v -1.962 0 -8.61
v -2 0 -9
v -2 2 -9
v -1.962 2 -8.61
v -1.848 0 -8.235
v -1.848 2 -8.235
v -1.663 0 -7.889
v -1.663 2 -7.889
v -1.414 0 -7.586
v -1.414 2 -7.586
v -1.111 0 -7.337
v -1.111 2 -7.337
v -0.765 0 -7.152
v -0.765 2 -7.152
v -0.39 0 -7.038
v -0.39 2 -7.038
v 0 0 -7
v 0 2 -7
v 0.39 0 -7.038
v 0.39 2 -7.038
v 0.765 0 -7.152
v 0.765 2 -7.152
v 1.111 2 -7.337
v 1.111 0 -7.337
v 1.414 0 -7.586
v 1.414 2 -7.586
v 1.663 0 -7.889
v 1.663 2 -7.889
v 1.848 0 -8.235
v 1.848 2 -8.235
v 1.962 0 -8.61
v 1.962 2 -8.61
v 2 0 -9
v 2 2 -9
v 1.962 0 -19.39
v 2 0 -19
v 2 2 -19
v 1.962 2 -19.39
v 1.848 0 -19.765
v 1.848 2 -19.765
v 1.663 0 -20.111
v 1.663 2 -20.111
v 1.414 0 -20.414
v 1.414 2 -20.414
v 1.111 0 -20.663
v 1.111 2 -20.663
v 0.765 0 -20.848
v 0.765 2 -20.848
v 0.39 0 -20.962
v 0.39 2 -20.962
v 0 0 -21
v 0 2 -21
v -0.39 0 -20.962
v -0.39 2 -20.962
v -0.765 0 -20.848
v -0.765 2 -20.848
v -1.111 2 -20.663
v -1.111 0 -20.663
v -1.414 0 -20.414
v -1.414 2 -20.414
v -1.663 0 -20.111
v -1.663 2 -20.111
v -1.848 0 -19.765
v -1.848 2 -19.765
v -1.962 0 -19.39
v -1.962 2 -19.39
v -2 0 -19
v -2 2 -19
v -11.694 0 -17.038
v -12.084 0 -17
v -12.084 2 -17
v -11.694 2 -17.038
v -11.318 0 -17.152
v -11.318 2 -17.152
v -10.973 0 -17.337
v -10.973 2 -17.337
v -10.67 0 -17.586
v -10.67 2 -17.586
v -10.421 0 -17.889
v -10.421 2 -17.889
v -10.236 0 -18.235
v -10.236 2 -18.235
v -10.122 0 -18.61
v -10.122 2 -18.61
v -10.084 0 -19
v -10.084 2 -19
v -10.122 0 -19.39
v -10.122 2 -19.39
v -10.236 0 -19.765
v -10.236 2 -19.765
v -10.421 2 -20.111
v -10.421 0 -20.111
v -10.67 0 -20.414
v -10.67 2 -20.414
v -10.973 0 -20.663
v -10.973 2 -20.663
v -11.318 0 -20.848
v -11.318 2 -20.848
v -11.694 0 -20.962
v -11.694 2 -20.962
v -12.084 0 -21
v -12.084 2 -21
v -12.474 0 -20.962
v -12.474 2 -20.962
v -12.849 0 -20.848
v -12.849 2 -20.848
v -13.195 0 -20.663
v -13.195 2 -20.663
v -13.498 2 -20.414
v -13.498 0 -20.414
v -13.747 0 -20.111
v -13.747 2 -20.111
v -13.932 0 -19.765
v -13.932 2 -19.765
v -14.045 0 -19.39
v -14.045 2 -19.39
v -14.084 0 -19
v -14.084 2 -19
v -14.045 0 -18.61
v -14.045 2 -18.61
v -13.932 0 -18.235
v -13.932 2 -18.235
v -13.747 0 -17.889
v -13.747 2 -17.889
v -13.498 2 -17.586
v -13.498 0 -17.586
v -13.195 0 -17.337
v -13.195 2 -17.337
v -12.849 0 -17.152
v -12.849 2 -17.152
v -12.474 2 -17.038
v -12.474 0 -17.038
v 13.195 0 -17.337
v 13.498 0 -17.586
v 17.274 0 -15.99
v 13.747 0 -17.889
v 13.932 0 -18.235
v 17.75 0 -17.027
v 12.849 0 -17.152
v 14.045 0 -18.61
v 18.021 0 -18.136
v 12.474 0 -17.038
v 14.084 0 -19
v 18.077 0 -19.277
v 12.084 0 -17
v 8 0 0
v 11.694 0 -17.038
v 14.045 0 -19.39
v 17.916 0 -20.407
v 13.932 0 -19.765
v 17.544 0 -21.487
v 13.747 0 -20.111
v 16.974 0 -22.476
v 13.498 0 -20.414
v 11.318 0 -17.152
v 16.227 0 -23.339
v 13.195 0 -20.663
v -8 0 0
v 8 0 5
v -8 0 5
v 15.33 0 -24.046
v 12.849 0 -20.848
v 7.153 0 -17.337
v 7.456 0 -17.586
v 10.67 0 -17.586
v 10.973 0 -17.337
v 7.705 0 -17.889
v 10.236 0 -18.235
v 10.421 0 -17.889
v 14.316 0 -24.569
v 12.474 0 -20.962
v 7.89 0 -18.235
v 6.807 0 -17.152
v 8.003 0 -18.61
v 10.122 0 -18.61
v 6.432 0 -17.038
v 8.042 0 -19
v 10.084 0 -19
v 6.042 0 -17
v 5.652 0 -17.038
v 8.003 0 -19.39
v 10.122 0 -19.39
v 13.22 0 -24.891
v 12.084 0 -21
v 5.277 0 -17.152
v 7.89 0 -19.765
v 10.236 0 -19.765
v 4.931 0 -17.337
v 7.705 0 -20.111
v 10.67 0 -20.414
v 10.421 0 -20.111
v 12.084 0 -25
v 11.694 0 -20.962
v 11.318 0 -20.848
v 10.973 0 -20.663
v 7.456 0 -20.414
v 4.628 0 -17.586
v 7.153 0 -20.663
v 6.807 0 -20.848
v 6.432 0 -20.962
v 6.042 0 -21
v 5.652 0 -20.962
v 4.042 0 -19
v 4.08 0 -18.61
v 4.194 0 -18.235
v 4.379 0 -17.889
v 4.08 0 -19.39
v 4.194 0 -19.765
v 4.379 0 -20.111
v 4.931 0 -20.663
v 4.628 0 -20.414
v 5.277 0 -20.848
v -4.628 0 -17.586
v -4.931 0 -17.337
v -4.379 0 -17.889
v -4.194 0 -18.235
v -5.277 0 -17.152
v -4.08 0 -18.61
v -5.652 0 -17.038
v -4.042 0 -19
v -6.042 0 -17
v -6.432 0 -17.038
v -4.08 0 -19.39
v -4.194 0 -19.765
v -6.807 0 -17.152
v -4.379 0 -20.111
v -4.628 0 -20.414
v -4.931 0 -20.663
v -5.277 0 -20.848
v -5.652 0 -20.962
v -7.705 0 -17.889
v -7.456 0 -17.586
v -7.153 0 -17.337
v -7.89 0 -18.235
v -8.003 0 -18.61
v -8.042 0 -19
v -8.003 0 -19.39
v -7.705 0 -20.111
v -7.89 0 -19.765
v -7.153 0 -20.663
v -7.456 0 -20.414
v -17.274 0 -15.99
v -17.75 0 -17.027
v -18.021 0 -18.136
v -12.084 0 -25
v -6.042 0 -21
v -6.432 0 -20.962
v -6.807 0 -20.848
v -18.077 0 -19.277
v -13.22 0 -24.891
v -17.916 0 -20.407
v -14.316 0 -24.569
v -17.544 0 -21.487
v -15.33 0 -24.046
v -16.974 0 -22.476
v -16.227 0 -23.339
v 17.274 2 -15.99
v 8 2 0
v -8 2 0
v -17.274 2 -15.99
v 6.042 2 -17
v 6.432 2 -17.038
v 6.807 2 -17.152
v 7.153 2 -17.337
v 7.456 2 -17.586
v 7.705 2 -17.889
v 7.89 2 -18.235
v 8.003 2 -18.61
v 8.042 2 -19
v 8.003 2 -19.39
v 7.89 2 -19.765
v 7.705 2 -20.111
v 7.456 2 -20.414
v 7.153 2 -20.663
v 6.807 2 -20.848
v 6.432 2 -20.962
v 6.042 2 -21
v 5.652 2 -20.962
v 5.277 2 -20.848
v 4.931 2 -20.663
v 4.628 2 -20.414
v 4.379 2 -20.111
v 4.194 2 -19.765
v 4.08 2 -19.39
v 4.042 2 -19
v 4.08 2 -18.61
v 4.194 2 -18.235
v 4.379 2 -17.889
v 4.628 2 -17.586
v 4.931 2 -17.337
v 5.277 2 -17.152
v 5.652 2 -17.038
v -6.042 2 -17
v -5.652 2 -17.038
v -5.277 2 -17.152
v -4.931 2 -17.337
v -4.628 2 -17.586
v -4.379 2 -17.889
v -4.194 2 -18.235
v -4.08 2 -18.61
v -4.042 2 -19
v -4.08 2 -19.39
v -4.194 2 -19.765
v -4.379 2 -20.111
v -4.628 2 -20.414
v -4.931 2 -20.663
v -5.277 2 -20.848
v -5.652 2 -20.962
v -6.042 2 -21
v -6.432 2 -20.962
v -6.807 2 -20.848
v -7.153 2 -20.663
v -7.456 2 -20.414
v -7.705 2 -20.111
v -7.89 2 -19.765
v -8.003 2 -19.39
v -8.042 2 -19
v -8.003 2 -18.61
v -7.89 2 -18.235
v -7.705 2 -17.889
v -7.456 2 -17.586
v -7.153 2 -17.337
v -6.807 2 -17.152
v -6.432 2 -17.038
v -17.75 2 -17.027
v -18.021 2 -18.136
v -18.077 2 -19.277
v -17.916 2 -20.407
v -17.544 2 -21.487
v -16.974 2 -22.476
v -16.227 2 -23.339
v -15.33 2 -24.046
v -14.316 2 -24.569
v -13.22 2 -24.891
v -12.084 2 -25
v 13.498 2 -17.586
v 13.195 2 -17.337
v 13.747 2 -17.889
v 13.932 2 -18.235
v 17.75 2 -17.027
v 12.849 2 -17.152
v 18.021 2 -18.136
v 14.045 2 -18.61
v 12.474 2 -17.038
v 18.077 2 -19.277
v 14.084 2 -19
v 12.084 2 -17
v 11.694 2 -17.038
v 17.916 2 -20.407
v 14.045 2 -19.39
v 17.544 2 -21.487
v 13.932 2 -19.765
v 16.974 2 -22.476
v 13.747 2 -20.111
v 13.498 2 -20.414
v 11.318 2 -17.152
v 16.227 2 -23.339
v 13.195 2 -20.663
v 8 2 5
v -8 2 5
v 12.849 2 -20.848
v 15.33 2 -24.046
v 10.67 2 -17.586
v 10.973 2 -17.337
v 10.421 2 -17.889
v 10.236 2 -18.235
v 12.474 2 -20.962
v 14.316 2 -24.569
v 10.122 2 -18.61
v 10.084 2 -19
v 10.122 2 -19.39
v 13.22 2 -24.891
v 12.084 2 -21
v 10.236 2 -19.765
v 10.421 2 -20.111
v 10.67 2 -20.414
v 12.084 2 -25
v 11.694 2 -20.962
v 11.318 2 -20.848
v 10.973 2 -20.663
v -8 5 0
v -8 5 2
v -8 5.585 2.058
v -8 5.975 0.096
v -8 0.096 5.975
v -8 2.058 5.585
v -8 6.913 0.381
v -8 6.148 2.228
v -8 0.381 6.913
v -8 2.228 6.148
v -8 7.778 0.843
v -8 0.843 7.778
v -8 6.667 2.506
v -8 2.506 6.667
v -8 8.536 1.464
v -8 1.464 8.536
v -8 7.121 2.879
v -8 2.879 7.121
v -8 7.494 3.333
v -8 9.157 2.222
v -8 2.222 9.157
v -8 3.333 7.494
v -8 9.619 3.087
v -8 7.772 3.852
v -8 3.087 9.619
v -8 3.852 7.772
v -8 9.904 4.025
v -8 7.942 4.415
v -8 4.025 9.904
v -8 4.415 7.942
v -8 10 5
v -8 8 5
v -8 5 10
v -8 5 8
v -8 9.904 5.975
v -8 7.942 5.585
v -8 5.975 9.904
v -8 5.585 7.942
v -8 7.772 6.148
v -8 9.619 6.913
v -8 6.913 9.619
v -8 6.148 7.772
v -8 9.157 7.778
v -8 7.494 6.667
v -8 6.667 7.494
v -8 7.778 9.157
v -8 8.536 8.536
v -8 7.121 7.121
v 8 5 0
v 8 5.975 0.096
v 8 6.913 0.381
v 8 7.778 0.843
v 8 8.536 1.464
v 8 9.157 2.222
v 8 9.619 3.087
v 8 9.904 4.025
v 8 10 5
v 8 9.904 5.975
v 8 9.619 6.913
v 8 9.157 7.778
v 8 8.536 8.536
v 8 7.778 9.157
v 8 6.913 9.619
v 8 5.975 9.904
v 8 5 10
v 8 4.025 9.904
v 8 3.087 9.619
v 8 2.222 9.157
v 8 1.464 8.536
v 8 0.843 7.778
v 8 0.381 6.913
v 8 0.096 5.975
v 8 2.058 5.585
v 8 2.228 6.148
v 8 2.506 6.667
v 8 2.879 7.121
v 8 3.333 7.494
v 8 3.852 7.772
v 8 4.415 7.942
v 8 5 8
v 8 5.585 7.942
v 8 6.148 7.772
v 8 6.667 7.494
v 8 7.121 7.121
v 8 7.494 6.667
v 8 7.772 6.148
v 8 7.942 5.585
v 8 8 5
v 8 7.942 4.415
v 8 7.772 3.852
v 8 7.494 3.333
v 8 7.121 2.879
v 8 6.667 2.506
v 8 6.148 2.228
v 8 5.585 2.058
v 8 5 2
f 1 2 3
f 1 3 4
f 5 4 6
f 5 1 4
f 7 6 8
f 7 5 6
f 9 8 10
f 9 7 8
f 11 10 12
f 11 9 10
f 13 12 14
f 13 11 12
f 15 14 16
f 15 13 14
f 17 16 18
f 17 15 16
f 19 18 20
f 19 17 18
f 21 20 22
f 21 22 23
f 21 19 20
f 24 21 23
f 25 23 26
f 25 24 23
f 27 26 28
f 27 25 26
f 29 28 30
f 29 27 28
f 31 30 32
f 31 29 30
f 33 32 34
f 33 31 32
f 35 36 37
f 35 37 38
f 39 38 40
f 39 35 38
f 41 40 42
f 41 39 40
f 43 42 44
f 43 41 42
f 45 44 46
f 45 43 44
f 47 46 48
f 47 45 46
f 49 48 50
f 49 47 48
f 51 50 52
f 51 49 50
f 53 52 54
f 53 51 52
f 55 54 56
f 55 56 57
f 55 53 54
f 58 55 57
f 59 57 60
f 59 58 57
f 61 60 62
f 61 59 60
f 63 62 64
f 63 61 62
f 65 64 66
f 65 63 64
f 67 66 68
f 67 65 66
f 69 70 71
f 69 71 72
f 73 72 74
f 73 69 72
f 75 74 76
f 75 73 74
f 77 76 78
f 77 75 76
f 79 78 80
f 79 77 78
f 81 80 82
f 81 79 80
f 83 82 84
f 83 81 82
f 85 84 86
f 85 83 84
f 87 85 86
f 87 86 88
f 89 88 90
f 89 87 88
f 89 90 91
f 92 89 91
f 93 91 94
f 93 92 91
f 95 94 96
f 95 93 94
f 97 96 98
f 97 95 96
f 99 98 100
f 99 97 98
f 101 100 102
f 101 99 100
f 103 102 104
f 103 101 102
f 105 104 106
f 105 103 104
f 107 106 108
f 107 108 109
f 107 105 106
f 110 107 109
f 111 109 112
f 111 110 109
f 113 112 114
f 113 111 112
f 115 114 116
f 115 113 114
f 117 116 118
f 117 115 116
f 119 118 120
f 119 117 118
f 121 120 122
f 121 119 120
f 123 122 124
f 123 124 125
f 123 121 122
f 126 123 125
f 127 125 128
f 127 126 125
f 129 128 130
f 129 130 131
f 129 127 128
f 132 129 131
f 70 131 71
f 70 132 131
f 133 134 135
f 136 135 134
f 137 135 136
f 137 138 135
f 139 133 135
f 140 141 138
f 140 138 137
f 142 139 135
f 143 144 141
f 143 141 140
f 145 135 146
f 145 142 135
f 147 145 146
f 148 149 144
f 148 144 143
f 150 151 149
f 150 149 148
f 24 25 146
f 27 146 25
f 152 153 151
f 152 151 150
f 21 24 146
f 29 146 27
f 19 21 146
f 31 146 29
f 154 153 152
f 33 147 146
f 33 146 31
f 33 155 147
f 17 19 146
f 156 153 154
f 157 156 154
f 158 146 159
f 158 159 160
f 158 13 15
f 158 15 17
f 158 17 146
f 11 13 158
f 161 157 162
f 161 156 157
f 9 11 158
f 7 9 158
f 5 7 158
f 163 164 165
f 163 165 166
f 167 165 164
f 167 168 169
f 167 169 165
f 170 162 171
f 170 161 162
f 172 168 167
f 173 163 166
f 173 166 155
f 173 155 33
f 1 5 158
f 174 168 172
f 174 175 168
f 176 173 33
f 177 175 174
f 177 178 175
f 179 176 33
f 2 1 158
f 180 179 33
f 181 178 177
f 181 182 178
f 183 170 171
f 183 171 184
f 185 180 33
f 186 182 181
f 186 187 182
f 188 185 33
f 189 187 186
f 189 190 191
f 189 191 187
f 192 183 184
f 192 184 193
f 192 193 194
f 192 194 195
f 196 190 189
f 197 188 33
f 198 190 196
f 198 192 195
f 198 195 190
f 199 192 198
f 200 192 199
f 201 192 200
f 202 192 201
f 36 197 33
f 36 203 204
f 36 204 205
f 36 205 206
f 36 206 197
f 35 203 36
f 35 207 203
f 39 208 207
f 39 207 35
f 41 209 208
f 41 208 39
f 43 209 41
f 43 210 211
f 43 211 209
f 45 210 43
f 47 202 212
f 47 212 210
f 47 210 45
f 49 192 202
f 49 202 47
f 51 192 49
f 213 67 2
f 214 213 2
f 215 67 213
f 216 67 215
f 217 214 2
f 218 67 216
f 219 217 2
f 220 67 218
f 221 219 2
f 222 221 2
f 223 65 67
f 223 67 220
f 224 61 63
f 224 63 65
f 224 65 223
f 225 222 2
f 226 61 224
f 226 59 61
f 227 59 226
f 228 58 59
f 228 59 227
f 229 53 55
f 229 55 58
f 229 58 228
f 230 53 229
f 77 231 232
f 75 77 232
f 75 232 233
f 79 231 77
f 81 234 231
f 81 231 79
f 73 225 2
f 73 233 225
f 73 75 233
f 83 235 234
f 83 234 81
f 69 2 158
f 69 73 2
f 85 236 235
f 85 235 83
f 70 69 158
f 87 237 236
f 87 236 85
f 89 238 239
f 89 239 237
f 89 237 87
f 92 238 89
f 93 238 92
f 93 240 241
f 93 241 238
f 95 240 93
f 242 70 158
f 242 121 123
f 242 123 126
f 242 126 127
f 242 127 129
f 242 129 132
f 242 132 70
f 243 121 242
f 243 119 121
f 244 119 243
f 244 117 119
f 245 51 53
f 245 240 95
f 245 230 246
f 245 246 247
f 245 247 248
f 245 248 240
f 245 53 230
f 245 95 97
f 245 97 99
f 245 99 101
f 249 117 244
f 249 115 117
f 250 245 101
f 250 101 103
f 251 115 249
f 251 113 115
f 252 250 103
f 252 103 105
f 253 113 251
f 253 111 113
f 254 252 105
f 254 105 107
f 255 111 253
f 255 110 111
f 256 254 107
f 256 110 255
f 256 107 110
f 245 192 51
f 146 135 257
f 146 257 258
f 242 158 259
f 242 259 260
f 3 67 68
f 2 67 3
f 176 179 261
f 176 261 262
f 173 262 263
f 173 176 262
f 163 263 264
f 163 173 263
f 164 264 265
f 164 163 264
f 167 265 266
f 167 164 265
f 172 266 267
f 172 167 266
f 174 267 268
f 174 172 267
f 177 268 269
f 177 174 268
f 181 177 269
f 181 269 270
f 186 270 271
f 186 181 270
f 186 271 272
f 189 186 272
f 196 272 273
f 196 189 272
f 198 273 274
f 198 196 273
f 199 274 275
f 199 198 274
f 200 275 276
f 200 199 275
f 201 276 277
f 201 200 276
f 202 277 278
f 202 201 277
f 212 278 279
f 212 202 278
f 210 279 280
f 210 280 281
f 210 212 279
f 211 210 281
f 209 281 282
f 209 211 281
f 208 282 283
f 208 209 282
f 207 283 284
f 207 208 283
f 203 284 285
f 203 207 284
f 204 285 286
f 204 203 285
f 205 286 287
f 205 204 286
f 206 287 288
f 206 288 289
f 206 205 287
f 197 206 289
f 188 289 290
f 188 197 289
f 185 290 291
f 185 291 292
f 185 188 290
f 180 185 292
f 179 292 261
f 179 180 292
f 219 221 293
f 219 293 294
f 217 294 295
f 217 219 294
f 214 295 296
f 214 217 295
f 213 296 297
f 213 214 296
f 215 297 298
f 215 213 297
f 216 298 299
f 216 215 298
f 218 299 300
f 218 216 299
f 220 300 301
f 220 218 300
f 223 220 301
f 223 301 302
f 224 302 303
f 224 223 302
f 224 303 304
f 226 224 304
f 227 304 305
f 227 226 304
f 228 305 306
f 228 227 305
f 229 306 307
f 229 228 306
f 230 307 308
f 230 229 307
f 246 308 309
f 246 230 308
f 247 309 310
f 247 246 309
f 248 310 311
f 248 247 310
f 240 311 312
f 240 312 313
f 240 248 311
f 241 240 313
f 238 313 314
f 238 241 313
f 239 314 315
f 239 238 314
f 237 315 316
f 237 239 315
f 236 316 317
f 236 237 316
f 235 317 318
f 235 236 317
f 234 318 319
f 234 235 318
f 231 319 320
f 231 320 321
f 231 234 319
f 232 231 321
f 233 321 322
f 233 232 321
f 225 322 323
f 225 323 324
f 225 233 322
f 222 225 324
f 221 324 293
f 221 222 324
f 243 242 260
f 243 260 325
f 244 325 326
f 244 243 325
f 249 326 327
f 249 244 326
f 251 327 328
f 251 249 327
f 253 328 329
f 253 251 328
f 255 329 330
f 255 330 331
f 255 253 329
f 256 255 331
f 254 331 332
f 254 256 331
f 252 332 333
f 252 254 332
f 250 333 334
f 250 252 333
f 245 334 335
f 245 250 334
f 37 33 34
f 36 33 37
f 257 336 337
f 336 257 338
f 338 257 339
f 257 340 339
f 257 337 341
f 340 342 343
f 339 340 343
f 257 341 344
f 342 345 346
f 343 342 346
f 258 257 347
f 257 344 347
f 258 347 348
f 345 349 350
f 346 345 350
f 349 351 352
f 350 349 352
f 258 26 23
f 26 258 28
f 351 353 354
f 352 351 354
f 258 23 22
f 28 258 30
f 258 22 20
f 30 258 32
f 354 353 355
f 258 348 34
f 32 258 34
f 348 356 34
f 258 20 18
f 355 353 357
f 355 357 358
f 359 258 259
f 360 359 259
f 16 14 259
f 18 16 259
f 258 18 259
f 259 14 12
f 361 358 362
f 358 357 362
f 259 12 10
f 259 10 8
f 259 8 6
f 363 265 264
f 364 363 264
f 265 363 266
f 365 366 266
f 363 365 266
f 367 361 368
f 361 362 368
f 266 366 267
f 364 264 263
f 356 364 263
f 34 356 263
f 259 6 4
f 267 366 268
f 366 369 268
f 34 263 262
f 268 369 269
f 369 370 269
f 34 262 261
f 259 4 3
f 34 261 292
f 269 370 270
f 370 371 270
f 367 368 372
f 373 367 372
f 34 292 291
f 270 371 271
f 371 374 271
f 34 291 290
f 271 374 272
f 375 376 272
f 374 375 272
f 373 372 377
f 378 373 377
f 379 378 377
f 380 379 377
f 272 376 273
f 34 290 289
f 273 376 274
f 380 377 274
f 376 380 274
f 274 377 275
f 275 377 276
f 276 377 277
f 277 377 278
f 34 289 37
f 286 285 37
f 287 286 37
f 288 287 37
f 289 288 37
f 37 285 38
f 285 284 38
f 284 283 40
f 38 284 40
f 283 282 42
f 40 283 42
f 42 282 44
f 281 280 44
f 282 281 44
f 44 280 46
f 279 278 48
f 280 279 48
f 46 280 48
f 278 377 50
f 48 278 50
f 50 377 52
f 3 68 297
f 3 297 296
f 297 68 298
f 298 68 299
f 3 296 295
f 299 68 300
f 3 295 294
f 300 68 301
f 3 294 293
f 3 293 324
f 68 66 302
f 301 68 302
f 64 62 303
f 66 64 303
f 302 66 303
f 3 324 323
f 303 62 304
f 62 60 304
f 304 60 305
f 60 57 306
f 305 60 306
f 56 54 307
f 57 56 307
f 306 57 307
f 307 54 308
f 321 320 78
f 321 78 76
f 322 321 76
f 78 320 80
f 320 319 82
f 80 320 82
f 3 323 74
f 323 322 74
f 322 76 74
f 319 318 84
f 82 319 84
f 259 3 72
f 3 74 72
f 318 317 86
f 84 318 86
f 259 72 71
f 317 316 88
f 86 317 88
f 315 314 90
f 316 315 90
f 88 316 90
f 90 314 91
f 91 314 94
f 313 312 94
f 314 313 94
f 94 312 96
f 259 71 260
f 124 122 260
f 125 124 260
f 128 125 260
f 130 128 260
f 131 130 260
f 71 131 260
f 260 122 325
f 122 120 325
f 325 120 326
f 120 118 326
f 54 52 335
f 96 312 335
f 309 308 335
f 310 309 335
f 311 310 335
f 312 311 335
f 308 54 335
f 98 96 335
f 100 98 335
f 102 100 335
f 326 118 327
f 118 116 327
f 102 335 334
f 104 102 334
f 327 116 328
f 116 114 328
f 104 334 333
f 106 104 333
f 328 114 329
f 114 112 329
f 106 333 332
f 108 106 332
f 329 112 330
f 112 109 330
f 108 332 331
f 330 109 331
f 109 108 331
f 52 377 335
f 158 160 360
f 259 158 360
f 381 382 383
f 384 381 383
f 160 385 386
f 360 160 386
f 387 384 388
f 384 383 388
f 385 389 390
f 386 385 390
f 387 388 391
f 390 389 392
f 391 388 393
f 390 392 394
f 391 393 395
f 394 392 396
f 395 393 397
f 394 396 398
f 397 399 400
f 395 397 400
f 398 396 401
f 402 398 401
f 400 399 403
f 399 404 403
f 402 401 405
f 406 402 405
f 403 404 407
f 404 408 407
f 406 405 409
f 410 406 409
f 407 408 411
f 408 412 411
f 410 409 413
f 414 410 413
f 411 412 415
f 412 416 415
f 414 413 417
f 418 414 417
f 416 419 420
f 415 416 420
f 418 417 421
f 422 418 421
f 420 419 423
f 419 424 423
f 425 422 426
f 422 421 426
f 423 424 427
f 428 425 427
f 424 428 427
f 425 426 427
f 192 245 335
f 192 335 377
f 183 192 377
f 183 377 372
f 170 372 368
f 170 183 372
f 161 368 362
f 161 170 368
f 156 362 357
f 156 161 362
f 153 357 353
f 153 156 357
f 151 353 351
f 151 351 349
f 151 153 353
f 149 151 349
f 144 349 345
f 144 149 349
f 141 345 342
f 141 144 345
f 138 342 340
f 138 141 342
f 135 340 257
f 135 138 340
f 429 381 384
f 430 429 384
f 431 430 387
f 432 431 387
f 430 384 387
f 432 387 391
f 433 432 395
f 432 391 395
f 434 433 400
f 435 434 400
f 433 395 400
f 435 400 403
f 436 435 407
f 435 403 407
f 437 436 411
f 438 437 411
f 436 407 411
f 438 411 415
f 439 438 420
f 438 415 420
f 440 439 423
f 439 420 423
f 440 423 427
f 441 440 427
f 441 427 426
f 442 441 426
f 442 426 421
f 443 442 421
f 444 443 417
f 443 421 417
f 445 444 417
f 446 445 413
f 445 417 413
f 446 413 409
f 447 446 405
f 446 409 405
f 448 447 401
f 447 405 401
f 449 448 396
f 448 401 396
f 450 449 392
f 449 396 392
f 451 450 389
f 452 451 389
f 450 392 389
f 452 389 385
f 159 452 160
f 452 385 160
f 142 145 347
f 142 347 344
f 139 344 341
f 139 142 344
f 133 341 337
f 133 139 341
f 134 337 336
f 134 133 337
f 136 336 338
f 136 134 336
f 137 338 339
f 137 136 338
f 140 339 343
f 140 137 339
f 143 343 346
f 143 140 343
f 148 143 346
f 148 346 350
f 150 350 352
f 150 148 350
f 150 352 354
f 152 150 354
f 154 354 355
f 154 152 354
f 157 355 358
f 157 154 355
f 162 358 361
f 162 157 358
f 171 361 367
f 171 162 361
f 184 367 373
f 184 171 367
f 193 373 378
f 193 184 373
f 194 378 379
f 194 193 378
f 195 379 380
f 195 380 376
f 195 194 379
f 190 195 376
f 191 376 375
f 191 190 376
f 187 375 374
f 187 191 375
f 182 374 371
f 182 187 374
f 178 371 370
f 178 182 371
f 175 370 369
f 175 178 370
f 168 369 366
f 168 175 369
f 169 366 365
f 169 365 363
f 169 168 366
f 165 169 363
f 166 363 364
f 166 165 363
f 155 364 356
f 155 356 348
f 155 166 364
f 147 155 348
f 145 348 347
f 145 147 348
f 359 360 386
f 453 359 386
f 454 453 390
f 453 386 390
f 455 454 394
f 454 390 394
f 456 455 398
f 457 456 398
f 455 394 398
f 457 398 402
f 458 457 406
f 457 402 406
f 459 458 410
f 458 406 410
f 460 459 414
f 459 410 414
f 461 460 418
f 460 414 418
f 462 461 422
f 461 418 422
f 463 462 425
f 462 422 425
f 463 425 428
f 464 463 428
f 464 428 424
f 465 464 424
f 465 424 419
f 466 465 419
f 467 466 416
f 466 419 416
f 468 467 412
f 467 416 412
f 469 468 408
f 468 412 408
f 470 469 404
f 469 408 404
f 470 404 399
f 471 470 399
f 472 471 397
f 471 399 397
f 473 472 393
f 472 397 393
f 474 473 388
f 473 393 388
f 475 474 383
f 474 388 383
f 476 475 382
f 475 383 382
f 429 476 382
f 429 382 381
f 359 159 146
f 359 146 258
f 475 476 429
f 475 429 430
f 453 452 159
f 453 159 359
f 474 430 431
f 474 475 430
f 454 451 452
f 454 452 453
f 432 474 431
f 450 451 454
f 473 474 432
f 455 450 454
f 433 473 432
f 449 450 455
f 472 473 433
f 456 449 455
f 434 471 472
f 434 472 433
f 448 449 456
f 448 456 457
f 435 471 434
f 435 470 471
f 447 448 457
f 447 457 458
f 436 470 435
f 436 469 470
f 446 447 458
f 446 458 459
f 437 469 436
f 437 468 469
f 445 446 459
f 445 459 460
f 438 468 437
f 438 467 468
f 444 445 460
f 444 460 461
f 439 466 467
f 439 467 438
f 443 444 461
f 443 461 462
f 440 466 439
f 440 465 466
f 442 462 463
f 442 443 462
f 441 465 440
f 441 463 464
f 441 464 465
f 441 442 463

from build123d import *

# Parameters (mm, degrees)
SKETCH_1_R             = 2
SM_BASE_FLANGE_1_DEPTH = 2
OTHER_START            = -8
OTHER_1_DEPTH          = 16


# Read off the part's stored shape, not the designer's step: 褶边1
# Sheet-metal steps are written as plain solids
with BuildPart() as part:
    # Sketch 1 → 基体-法兰1 (new body)
    with BuildSketch(Plane(origin=(0, 0, 0), x_dir=(1, 0, 0), z_dir=(0, 1, 0))):
        with BuildLine():
            Line((-12.083833912, 25), (12.083833912, 25))
            ThreePointArc((12.083833912, 25), (17.282961302, 21.994841295), (17.274021048, 15.989691461))
            Line((17.274021048, 15.989691461), (8, 0))
            Line((8, 0), (8, -5))
            Line((8, -5), (-8, -5))
            Line((-8, -5), (-8, 0))
            Line((-8, 0), (-17.274021048, 15.989691461))
            ThreePointArc((-17.274021048, 15.989691461), (-17.282961302, 21.994841295), (-12.083833912, 25))
        make_face()
        with Locations(Location((-12.083833912, 19, 0), (0, 0, 270))):
            Circle(SKETCH_1_R, mode=Mode.SUBTRACT)
        with Locations(Location((-6.041916956, 19, 0), (0, 0, 270))):
            Circle(SKETCH_1_R, mode=Mode.SUBTRACT)
        with Locations(Location((6.041916956, 19, 0), (0, 0, 270))):
            Circle(SKETCH_1_R, mode=Mode.SUBTRACT)
        with Locations(Location((12.083833912, 19, 0), (0, 0, 270))):
            Circle(SKETCH_1_R, mode=Mode.SUBTRACT)
        with BuildLine():
            Line((-2, 19), (-2, 9))
            ThreePointArc((-2, 9), (0, 7), (2, 9))
            Line((2, 9), (2, 19))
            ThreePointArc((2, 19), (0, 21), (-2, 19))
        make_face(mode=Mode.SUBTRACT)
    extrude(amount=SM_BASE_FLANGE_1_DEPTH)

    # Other 1 outline → Other 1 (add)
    with BuildSketch(Plane.YZ.offset(OTHER_START)):
        with BuildLine():
            Line((5, 2), (5, 0))
            ThreePointArc((5, 0), (8.535533906, 8.535533906), (0, 5))
            Line((0, 5), (2, 5))
            ThreePointArc((2, 5), (7.121320344, 7.121320344), (5, 2))
        make_face()
    extrude(amount=OTHER_1_DEPTH)


solid = part.part
